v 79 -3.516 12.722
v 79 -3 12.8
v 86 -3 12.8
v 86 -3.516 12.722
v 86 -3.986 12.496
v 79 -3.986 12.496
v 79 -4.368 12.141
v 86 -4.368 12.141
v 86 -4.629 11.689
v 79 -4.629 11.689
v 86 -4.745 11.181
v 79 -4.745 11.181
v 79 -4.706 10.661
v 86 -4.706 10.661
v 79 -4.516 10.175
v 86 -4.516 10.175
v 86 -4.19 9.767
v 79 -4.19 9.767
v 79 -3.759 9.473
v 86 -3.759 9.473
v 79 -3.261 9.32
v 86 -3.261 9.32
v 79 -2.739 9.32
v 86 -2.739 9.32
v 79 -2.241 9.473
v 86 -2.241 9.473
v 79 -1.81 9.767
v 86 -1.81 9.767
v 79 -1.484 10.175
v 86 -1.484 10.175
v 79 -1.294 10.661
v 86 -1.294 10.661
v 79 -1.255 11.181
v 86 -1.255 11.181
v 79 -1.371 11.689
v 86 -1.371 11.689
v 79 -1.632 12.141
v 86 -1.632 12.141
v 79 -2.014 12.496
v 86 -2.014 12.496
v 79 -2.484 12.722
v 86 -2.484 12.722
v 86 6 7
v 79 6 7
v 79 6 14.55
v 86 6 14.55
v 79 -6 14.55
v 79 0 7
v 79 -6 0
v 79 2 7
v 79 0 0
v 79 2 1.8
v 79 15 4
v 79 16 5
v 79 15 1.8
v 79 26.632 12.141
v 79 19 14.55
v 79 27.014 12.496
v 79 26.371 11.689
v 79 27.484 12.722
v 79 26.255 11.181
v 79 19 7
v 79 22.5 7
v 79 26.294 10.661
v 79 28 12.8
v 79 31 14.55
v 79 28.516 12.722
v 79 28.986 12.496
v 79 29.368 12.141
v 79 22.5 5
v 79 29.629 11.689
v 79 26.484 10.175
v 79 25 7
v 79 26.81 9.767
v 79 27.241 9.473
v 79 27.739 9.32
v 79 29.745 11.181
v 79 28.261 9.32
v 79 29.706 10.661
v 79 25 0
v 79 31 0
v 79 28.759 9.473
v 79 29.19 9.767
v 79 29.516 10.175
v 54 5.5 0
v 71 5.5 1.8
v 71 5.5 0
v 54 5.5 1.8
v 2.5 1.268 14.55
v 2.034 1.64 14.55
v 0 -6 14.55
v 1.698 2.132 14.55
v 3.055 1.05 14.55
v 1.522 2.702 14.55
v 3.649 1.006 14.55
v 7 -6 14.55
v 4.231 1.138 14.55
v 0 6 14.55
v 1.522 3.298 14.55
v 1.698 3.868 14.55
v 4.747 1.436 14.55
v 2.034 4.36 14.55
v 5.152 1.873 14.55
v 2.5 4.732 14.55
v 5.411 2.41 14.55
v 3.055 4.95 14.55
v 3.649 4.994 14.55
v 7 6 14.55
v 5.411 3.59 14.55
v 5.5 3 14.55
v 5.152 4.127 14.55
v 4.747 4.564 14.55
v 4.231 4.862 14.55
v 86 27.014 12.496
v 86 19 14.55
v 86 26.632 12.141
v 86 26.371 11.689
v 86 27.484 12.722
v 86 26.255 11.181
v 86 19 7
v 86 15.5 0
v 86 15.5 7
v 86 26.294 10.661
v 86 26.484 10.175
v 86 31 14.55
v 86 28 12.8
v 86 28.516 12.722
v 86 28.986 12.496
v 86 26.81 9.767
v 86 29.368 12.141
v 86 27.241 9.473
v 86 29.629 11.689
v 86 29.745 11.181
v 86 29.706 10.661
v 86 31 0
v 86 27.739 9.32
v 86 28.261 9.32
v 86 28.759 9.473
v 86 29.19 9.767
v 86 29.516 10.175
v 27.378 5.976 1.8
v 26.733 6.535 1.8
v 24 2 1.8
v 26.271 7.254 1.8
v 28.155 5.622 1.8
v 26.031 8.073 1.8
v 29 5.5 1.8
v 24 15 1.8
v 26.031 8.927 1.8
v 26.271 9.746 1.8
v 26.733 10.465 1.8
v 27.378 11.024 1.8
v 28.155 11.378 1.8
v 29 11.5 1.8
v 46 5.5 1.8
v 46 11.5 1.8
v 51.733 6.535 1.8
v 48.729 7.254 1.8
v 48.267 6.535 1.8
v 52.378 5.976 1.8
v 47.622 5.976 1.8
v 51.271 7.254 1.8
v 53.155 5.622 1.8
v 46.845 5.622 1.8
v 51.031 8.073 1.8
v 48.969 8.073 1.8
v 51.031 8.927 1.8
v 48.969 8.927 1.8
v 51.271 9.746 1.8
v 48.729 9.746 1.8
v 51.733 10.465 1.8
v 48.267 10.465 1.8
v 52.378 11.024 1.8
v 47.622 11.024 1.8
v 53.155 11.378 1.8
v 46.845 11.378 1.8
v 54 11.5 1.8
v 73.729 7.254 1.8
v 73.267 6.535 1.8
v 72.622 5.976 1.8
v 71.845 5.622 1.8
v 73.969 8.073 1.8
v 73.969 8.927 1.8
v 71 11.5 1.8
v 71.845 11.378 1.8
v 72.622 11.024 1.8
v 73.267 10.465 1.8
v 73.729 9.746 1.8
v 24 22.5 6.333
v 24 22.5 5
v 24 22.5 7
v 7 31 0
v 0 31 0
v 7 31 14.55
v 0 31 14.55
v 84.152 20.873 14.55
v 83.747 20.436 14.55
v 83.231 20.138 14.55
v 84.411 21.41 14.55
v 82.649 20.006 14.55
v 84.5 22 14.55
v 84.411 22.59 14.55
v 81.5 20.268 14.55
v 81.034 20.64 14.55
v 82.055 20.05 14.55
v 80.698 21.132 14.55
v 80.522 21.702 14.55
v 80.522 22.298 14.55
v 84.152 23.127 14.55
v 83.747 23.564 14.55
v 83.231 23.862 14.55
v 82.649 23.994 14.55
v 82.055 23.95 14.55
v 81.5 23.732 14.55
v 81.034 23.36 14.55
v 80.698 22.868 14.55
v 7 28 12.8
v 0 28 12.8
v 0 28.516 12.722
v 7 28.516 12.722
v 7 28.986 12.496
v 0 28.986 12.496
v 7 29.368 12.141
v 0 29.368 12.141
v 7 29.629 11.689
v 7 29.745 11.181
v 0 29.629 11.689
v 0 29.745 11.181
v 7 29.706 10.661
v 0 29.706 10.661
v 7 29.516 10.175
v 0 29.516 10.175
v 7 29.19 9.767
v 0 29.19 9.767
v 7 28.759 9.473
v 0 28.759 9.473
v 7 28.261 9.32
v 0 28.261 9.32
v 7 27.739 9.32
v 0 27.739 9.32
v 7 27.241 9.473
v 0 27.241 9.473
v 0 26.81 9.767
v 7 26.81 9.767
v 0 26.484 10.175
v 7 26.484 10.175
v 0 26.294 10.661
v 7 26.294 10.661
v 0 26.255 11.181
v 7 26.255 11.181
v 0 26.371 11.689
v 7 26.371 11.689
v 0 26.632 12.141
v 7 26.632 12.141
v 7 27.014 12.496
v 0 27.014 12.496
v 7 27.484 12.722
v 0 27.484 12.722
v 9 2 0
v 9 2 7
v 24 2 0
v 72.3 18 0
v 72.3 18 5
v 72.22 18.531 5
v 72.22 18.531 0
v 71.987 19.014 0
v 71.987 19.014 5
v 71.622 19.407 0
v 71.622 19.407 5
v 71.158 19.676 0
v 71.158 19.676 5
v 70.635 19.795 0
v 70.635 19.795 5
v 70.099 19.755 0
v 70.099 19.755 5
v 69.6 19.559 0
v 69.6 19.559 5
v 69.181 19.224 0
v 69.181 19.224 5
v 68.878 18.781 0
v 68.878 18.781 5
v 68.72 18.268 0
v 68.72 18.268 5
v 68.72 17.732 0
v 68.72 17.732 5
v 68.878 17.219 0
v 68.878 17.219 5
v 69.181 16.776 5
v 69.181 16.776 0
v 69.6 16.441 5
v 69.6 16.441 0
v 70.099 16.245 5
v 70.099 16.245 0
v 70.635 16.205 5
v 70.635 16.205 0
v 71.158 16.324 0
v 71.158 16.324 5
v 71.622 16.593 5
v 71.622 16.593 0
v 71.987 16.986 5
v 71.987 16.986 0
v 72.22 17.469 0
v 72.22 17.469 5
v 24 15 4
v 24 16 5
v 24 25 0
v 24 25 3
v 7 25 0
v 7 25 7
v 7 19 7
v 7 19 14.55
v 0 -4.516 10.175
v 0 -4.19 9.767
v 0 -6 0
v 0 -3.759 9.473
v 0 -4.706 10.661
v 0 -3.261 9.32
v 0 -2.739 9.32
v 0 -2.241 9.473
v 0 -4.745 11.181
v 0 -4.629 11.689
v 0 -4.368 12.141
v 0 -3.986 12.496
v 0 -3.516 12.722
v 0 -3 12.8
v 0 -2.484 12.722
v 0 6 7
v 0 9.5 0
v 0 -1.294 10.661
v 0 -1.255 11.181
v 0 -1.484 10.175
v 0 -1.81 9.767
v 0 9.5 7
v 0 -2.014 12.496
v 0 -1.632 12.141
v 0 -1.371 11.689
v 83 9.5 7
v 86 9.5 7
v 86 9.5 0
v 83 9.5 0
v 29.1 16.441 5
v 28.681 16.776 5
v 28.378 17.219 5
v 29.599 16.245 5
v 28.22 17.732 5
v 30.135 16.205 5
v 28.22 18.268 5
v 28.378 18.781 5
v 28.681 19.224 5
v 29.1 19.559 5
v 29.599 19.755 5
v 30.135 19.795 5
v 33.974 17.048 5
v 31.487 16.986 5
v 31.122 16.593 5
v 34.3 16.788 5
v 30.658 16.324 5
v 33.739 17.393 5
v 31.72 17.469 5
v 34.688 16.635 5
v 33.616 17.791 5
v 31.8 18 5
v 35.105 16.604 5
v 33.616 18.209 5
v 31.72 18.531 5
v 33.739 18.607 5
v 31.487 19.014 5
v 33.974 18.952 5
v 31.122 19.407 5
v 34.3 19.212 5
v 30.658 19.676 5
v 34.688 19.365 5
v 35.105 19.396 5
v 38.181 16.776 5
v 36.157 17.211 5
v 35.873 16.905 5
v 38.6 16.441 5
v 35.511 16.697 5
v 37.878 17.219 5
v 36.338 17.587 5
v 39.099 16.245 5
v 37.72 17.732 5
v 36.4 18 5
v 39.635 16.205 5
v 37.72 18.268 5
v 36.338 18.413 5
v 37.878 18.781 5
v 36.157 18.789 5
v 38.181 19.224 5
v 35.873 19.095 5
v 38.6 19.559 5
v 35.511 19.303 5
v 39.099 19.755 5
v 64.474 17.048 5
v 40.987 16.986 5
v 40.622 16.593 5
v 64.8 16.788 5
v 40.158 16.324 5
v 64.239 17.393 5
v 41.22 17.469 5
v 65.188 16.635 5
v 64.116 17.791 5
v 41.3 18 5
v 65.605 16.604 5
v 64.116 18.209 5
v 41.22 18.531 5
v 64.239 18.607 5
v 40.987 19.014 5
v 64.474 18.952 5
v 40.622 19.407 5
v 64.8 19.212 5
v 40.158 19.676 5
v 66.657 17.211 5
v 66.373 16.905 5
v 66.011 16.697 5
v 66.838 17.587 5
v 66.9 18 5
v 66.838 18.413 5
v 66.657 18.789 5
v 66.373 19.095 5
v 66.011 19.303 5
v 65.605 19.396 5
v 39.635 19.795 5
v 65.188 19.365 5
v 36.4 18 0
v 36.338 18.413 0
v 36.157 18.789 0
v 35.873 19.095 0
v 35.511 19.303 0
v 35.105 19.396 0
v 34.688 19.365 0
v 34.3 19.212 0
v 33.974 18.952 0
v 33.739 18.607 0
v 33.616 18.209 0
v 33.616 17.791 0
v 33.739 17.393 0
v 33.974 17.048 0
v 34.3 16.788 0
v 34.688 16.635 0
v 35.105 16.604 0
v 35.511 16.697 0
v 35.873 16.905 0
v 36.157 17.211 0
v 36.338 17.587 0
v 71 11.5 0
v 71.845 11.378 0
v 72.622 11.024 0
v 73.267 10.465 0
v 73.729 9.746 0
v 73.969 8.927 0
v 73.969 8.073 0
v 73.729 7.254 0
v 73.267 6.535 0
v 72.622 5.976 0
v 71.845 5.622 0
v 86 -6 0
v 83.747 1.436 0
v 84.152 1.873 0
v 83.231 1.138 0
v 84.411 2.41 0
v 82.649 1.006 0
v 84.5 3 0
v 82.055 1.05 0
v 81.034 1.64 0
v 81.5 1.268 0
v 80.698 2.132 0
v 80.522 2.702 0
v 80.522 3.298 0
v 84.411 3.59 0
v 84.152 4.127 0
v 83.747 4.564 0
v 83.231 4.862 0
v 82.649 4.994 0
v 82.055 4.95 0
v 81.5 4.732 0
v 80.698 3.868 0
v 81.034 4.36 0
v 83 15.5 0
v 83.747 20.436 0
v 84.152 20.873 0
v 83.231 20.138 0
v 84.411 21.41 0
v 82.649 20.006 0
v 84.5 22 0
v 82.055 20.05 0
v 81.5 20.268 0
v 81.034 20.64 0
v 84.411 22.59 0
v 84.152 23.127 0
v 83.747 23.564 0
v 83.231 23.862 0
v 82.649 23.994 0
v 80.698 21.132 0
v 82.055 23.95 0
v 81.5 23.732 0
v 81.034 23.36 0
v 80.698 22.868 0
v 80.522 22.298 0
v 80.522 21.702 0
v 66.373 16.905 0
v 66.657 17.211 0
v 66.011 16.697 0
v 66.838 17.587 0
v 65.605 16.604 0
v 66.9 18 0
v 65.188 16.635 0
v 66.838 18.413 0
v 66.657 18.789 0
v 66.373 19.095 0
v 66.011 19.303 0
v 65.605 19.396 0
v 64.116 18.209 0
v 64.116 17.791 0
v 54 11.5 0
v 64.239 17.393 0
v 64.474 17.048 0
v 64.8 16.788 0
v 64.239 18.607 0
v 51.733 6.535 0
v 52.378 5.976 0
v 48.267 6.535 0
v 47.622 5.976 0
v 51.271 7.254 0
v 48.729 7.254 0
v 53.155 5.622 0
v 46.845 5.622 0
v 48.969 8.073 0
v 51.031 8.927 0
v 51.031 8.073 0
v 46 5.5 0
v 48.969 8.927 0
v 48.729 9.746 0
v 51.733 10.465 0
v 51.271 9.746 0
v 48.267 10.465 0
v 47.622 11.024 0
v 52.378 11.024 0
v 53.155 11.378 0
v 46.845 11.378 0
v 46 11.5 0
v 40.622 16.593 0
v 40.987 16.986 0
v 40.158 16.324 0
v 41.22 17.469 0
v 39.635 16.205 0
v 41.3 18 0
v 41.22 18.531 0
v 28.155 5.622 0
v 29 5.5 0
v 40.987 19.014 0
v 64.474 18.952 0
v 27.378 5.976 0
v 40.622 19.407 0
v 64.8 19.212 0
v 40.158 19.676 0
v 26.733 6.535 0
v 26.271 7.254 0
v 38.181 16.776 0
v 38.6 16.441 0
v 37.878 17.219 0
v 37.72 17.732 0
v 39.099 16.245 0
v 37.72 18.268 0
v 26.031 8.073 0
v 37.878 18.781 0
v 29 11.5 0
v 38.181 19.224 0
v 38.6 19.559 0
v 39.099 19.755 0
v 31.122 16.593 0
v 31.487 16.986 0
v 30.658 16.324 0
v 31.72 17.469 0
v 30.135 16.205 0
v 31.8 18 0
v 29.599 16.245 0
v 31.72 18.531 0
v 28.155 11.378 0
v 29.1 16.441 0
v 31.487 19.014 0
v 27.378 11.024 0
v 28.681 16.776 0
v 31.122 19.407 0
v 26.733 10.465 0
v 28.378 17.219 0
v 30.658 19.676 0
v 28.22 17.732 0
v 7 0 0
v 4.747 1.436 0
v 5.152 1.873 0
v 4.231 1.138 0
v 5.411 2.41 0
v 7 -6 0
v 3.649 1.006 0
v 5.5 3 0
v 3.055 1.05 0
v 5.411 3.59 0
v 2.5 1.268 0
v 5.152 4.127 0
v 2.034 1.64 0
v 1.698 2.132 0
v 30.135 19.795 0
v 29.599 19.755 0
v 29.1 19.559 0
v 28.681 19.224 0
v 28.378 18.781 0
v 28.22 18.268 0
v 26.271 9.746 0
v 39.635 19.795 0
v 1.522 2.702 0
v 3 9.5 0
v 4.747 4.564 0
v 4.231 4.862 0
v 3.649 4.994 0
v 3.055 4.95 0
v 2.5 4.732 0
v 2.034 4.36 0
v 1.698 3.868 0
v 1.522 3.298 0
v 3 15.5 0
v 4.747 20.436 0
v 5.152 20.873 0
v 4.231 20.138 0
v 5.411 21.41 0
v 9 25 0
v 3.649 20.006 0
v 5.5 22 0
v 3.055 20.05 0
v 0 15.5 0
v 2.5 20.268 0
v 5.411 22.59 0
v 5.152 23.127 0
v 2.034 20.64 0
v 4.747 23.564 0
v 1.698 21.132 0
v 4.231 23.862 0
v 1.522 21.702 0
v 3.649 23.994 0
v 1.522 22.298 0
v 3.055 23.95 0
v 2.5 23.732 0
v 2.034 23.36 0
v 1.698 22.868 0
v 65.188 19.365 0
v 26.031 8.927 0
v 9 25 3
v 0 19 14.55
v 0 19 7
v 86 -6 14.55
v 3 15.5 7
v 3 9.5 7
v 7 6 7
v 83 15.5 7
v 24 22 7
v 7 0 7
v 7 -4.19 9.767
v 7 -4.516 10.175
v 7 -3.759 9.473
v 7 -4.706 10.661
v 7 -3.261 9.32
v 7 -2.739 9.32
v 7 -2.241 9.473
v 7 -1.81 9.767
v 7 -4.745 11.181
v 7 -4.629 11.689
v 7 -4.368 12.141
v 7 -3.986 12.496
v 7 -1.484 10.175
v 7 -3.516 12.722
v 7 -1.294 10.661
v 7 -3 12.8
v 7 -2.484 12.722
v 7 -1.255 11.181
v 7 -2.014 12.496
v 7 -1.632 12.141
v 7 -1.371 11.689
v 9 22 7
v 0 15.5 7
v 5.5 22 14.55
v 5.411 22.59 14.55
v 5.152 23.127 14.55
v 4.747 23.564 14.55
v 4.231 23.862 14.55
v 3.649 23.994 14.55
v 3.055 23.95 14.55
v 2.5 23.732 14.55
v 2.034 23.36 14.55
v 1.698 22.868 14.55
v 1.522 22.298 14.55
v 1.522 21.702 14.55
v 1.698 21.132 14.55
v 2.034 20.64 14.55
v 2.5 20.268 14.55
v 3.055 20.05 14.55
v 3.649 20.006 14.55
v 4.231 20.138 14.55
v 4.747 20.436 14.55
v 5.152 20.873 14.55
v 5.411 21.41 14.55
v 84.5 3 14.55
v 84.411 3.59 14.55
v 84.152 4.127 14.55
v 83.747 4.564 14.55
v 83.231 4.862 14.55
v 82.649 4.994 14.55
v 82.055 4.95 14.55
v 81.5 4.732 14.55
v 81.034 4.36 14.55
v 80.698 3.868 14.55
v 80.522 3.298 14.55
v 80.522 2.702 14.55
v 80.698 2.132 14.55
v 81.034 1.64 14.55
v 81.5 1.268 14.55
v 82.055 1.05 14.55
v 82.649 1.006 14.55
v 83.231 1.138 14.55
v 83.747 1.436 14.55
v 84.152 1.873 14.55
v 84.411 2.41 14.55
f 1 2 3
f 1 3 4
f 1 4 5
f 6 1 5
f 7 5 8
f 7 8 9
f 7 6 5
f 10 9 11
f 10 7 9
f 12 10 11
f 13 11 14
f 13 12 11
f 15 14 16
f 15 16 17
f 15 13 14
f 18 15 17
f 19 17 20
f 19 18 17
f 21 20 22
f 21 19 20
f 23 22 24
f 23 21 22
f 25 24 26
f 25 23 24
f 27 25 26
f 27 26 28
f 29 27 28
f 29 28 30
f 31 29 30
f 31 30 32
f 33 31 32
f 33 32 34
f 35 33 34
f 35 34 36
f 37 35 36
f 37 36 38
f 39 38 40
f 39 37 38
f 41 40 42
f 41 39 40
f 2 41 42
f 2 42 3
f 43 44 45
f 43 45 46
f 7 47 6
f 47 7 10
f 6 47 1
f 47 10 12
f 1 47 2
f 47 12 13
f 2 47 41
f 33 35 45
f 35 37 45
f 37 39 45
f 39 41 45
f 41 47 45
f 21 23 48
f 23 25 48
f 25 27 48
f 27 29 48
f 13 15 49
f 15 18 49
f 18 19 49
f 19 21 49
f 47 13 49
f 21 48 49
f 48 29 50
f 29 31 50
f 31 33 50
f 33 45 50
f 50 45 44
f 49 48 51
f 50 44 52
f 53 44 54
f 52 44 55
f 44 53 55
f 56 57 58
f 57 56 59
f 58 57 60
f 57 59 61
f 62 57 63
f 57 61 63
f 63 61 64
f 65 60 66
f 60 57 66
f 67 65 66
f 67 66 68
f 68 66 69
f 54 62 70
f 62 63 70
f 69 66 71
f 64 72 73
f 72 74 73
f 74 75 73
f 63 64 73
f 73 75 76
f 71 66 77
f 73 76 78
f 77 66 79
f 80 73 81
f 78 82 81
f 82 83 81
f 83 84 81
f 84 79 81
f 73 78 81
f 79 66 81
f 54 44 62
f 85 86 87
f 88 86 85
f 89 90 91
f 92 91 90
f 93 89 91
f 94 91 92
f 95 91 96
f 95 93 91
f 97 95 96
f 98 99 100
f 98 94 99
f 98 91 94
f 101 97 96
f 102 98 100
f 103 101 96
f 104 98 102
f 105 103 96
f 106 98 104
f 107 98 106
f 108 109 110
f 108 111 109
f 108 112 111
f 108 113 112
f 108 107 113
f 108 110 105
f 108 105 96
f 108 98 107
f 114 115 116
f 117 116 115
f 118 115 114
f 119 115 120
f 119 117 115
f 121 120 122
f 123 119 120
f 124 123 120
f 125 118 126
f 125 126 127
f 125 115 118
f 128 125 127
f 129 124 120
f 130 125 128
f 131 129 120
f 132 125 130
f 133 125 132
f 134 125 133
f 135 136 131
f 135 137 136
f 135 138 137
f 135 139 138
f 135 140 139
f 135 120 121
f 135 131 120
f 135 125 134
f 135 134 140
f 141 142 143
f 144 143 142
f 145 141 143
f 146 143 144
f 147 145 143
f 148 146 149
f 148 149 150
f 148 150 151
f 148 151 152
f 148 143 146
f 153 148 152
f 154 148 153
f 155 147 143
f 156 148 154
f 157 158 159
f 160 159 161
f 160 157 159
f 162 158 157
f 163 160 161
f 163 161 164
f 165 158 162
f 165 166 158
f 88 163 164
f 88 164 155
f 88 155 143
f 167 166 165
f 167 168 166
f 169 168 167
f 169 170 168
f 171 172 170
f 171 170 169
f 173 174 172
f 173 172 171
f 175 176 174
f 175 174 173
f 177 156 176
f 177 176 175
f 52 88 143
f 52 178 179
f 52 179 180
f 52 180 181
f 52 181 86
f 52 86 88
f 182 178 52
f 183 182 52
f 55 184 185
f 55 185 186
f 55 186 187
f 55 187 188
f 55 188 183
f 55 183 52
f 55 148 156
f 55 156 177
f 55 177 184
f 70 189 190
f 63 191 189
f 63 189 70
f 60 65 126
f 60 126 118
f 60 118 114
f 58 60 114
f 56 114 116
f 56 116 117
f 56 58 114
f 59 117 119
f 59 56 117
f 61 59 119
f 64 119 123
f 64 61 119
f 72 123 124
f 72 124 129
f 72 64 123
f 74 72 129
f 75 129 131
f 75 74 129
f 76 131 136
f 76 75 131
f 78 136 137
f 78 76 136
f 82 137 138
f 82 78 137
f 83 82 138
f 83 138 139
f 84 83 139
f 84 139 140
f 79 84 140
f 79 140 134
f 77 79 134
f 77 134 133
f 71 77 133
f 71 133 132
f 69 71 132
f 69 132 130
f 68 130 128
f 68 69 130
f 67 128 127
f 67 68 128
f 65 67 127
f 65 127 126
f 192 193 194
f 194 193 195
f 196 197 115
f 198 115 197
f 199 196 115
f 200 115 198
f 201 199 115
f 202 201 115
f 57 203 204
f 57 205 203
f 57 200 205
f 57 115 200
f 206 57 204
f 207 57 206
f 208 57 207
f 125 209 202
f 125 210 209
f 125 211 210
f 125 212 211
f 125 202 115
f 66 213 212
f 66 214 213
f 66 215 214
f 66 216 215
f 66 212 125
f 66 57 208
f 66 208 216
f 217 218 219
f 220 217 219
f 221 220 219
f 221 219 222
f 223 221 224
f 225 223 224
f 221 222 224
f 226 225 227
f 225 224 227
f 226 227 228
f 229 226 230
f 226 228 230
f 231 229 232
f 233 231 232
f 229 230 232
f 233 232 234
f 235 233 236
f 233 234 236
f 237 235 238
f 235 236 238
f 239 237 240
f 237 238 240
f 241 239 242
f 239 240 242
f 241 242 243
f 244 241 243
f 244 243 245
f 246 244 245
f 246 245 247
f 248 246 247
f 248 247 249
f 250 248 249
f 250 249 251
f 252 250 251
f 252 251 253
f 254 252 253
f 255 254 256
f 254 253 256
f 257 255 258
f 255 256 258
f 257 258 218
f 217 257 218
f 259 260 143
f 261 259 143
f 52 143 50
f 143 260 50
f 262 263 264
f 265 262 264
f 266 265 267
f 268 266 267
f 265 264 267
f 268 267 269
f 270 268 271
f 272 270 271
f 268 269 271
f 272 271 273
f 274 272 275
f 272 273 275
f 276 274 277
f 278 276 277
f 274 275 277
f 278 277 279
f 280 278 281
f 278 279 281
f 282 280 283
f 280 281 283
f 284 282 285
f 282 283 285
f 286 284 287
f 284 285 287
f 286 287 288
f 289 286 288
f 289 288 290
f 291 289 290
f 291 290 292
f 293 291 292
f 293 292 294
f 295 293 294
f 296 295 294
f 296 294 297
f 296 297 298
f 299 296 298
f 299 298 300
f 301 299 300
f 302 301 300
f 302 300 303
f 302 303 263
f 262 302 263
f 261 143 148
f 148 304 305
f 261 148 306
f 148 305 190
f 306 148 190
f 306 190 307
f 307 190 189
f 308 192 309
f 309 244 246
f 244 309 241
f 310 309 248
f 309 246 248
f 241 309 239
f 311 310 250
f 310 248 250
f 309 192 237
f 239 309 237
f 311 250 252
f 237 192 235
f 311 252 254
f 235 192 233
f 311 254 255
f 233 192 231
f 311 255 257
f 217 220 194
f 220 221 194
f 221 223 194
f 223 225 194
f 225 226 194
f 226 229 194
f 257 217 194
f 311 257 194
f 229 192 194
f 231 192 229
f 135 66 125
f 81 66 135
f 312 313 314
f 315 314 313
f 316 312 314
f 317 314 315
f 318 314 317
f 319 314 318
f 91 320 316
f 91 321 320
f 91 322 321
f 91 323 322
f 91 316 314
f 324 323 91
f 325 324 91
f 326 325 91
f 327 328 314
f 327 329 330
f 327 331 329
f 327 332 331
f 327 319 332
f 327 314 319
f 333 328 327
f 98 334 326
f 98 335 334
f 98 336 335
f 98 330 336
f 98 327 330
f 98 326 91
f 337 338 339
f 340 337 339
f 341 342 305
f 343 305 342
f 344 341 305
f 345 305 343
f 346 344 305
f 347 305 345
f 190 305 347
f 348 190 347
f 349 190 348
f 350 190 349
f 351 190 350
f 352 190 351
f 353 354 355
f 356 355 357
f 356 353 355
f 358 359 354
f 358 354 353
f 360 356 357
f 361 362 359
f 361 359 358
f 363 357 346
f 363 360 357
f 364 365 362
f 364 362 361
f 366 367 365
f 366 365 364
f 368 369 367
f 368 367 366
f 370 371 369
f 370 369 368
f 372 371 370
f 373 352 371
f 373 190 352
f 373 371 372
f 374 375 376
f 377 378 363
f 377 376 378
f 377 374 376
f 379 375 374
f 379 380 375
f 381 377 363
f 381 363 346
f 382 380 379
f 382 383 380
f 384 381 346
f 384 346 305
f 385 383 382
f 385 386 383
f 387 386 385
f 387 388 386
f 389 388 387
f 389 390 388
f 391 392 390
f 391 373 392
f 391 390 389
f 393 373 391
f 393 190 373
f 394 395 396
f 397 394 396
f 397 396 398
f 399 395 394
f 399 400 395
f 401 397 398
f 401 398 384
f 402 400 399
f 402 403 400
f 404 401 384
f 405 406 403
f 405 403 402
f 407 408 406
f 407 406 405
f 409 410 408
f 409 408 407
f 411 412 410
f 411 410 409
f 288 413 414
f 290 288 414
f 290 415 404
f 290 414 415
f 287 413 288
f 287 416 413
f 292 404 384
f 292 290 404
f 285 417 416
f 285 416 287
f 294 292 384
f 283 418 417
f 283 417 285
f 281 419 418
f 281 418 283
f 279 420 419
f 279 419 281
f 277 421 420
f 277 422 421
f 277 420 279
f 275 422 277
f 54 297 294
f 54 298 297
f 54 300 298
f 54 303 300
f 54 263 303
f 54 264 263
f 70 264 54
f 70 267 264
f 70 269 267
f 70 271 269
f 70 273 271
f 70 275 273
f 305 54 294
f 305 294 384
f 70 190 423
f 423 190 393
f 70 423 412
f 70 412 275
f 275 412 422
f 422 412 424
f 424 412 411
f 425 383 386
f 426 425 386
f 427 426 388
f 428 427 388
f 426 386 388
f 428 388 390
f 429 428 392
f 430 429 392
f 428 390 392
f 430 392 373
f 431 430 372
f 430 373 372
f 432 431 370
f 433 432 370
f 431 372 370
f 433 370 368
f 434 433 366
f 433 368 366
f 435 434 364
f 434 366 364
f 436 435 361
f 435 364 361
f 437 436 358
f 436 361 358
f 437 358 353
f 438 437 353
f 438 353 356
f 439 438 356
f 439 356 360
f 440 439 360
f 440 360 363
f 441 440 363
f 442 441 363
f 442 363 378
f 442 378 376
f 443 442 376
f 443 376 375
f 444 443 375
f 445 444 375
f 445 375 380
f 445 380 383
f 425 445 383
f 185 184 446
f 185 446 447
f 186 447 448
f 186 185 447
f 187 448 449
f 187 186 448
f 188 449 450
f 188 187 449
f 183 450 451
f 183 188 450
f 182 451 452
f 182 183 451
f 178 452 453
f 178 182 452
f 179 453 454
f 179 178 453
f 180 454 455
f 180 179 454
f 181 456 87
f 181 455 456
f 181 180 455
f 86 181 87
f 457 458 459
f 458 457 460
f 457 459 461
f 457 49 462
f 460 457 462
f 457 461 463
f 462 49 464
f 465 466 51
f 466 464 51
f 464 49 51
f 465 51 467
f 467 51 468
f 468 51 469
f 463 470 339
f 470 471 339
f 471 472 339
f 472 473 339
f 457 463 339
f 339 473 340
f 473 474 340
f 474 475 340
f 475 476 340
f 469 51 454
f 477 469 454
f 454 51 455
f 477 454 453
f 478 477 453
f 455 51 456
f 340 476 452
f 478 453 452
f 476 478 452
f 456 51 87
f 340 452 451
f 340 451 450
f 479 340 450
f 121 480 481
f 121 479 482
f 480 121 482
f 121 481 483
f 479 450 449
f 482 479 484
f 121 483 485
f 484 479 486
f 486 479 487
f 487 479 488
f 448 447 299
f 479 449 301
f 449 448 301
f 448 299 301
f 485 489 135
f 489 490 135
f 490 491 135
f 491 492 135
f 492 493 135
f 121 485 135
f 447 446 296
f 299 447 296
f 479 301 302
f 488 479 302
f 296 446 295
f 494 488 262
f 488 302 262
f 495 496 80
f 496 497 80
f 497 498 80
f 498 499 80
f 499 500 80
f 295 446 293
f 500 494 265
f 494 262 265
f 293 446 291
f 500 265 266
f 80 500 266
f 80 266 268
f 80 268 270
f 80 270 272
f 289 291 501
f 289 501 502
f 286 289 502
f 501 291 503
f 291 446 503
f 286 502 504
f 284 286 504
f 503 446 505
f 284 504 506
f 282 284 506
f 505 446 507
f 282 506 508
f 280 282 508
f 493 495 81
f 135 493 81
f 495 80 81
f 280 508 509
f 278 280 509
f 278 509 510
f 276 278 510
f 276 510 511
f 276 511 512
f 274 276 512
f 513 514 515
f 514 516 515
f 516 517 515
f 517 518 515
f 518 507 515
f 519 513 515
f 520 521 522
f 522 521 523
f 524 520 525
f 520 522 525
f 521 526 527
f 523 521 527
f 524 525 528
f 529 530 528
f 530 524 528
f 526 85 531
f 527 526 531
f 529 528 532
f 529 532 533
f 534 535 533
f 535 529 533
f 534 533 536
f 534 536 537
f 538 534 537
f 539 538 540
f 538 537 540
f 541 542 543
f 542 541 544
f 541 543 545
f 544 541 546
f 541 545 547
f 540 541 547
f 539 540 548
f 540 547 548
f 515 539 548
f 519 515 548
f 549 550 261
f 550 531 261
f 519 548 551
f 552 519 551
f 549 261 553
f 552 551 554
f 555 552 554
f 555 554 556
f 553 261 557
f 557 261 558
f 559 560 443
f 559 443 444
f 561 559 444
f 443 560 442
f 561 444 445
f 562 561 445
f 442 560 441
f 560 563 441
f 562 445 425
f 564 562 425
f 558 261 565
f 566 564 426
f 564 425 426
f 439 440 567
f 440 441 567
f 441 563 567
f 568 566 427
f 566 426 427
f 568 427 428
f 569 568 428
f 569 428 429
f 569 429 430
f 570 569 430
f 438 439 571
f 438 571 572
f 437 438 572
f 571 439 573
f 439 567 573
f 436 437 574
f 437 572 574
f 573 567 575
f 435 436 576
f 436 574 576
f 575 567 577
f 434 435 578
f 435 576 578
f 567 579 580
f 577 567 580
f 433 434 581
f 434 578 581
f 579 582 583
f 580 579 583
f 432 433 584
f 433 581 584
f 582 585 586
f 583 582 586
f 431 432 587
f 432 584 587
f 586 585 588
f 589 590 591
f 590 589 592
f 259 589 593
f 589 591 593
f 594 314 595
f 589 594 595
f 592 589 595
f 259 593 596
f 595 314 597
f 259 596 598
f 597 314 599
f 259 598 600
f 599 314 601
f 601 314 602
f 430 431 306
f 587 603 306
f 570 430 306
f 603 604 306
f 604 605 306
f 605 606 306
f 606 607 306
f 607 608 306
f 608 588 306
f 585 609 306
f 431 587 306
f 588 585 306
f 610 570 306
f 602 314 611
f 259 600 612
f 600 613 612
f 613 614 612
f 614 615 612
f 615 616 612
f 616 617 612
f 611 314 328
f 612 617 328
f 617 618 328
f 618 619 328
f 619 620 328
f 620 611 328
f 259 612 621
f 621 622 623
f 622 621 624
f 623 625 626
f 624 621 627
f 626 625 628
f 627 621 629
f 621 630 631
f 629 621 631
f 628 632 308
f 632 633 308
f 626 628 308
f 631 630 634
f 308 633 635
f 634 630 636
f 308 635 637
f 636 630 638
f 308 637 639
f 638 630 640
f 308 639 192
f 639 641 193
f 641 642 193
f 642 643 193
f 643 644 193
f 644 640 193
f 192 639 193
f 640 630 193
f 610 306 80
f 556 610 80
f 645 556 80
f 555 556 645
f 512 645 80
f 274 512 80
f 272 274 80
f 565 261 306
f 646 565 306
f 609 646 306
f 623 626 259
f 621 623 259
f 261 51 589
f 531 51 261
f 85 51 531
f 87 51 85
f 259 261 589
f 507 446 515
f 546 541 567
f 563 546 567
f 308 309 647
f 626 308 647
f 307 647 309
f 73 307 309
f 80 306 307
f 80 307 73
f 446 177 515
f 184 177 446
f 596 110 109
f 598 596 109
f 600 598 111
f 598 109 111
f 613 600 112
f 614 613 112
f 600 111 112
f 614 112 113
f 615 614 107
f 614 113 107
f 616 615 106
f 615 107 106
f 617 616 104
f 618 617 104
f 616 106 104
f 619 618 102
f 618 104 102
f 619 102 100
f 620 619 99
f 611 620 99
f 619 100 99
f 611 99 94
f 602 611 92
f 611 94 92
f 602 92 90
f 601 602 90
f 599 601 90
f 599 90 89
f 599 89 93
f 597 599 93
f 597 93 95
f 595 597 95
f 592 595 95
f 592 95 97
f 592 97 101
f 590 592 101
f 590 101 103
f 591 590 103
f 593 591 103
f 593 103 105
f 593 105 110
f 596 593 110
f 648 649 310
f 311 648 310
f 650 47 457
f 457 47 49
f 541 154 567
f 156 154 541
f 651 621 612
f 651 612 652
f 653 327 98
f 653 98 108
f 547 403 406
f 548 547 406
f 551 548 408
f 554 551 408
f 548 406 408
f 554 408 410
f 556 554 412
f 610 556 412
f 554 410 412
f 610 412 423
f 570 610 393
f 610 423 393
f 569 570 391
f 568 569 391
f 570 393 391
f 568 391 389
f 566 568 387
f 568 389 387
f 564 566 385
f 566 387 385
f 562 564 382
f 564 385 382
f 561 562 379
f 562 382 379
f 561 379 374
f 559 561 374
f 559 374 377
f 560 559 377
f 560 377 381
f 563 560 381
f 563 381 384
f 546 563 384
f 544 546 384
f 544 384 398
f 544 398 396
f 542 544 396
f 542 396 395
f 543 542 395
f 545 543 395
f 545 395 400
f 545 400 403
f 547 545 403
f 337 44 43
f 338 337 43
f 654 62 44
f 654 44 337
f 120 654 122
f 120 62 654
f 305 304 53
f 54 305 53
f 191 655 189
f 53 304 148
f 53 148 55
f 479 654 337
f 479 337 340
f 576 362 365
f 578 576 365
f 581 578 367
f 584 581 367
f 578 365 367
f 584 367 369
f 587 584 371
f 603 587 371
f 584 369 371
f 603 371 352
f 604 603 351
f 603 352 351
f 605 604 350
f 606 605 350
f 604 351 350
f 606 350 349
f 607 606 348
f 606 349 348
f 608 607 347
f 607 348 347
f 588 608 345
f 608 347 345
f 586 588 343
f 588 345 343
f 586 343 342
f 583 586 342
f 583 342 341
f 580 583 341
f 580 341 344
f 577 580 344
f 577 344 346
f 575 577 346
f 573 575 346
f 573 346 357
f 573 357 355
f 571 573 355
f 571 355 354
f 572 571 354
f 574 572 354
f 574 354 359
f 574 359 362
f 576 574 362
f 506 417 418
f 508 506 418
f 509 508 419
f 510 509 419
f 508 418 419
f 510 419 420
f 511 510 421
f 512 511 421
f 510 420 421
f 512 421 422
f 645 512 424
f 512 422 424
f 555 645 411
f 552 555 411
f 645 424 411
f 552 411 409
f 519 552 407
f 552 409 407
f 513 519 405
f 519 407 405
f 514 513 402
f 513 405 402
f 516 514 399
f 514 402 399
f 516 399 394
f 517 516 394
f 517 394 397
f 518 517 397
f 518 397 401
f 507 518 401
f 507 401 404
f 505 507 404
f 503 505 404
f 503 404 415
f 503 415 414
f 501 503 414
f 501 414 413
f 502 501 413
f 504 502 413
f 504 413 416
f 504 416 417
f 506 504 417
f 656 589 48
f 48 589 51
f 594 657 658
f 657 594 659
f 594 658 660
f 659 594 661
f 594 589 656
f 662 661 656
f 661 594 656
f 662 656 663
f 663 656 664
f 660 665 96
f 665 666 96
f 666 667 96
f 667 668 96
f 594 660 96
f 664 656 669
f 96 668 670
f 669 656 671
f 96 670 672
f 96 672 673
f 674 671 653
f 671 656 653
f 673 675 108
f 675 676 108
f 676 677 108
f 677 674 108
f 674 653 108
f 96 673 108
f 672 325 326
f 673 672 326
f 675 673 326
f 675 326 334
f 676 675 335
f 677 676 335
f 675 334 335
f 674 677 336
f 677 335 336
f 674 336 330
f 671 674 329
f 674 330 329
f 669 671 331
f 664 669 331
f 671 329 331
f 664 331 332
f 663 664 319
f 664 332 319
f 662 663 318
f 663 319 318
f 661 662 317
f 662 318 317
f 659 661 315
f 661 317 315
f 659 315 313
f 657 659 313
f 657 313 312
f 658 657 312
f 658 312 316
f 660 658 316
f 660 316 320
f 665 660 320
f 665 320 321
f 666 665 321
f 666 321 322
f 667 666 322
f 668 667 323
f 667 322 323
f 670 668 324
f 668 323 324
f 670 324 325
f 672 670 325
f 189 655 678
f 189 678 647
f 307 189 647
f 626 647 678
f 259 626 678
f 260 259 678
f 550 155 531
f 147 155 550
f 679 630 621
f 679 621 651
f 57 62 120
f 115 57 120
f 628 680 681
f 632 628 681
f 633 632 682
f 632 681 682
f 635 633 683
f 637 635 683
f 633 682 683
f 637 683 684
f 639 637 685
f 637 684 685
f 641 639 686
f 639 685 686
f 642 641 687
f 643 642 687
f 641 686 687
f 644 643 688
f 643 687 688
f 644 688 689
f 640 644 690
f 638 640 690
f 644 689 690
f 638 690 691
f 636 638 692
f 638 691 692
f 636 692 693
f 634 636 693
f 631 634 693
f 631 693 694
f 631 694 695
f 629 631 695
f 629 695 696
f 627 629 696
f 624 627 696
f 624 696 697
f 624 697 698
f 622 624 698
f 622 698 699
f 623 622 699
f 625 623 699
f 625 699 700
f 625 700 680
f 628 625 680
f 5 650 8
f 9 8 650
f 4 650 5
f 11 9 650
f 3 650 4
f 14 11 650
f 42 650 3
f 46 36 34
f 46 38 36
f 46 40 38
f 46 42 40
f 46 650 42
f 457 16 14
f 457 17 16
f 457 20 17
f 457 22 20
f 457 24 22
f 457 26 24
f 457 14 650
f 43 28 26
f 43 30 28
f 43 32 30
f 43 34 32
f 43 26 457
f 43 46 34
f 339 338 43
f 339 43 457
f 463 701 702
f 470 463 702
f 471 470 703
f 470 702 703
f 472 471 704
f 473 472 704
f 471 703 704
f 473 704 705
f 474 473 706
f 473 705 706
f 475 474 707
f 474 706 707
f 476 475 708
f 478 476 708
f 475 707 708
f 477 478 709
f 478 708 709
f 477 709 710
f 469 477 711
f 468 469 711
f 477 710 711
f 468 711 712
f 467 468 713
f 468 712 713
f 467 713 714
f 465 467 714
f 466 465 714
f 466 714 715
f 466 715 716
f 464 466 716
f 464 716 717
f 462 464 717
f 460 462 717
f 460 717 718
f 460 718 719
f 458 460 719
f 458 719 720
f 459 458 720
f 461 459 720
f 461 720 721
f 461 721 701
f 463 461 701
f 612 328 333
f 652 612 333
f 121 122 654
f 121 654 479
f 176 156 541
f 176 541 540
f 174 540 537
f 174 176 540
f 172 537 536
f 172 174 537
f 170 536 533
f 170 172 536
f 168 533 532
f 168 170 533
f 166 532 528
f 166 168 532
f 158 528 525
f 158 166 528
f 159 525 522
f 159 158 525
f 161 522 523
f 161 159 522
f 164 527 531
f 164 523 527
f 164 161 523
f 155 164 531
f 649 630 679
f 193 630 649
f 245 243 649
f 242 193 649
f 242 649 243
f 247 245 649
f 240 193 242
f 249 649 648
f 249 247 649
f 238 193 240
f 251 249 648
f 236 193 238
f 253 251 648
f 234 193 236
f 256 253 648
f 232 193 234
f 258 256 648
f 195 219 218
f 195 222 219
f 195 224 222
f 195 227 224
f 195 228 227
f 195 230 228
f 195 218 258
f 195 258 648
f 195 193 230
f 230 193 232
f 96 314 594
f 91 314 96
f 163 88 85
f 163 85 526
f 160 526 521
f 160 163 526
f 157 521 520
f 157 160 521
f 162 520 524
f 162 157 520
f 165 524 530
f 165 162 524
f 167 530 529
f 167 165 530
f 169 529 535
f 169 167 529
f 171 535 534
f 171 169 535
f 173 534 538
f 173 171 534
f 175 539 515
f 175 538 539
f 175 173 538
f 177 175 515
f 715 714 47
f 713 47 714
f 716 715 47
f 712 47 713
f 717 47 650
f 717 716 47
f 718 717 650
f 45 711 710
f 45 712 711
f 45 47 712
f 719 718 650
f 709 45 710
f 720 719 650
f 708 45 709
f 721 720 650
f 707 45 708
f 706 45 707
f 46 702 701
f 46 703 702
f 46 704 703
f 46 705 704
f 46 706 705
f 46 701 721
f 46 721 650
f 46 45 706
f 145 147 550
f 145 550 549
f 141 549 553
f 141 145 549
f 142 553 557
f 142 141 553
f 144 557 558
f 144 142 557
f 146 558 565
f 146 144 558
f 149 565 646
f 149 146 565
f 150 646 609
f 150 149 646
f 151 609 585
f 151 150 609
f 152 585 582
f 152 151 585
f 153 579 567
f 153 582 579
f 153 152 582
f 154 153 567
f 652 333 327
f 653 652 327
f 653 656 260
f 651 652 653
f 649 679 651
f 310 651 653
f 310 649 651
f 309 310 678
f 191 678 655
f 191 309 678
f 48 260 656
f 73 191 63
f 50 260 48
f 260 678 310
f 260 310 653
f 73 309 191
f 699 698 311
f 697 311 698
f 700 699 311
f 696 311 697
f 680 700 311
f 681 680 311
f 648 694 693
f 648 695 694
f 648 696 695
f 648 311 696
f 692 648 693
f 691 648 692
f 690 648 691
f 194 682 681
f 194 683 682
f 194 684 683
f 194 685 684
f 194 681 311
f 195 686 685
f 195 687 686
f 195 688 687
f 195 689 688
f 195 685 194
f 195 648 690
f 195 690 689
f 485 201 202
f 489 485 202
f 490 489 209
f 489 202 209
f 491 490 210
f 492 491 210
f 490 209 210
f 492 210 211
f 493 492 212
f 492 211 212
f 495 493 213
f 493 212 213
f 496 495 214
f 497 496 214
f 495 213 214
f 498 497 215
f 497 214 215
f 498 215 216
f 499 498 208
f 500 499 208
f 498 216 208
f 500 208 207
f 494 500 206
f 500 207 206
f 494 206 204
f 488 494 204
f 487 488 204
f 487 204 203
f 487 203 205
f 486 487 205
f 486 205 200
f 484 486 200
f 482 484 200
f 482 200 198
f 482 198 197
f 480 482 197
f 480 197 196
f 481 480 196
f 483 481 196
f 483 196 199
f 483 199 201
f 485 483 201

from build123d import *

# Parameters (mm, degrees)
SKETCH_1_W           = 86
SKETCH_1_H           = 25
EXTRUDE_1_DEPTH      = 7
SKETCH_2_W           = 15
SKETCH_2_H           = 17
CUT_EXTRUDE_1_DEPTH  = 90.833178726
SKETCH_3_W           = 55
SKETCH_3_H           = 13
CUT_EXTRUDE_2_DEPTH  = 5.2
SKETCH_4_W           = 55
SKETCH_4_H           = 7.5
CUT_EXTRUDE_3_DEPTH  = 2
CHAMFER_1_SIZE       = 1
SKETCH_5_R           = 1.8
CUT_EXTRUDE_4_DEPTH  = 90.699498326
SKETCH_6_R           = 1.4
CUT_EXTRUDE_5_DEPTH  = 90.699498326
CUT_EXTRUDE_6_DEPTH  = 90.710868907
SKETCH_8_W           = 7
SKETCH_8_H           = 6
EXTRUDE_2_DEPTH      = 7.55
SKETCH_9_R           = 2
CUT_EXTRUDE_7_DEPTH  = 91.734241056
SKETCH_10_W          = 14.55
SKETCH_10_H          = 6
SKETCH_10_R          = 1.75
EXTRUDE_3_DEPTH      = 7
EXTRUDE_START        = -7
SKETCH_12_W          = 14.55
SKETCH_12_H          = 6
SKETCH_12_R          = 1.75
EXTRUDE_5_DEPTH      = 7
SKETCH_13_W          = 7
SKETCH_13_H          = 6
CUT_EXTRUDE_8_DEPTH  = 3
SKETCH_14_W          = 7
SKETCH_14_H          = 6
CUT_EXTRUDE_9_DEPTH  = 3
CUT_EXTRUDE_10_DEPTH = 15


with BuildPart() as part:
    # 草图1 → 凸台-拉伸1 (new body)
    with BuildSketch(Plane.XY):
        with Locations((43, 12.5)):
            Rectangle(SKETCH_1_W, SKETCH_1_H)
    extrude(amount=EXTRUDE_1_DEPTH)

    # 草图2 → 切除-拉伸1 (cut, through all)
    with BuildSketch(Plane.XY.offset(7)):
        with Locations((16.5, 10.5)):
            Rectangle(SKETCH_2_W, SKETCH_2_H)
    extrude(amount=-CUT_EXTRUDE_1_DEPTH, mode=Mode.SUBTRACT)

    # 草图3 → 切除-拉伸2 (cut)
    with BuildSketch(Plane.XY.offset(7)):
        with Locations((51.5, 8.5)):
            Rectangle(SKETCH_3_W, SKETCH_3_H)
    extrude(amount=-CUT_EXTRUDE_2_DEPTH, mode=Mode.SUBTRACT)

    # 草图4 → 切除-拉伸3 (cut)
    with BuildSketch(Plane.XY.offset(7)):
        with Locations((51.5, 18.75)):
            Rectangle(SKETCH_4_W, SKETCH_4_H)
    extrude(amount=-CUT_EXTRUDE_3_DEPTH, mode=Mode.SUBTRACT)

    # 倒角1
    chamfer_1_edges = [part.edges().sort_by_distance(p)[0] for p in [
        (51.5, 15, 5),
    ]]
    chamfer(chamfer_1_edges, length=CHAMFER_1_SIZE)

    # 草图5 → 切除-拉伸4 (cut, through all)
    with BuildSketch(Plane.XY.offset(5)):
        with Locations((30, 18)):
            Circle(SKETCH_5_R)
        with Locations((39.5, 18)):
            Circle(SKETCH_5_R)
        with Locations((70.5, 18)):
            Circle(SKETCH_5_R)
    extrude(amount=-CUT_EXTRUDE_4_DEPTH, mode=Mode.SUBTRACT)

    # 草图6 → 切除-拉伸5 (cut, through all)
    with BuildSketch(Plane.XY.offset(5)):
        with Locations((35, 18)):
            Circle(SKETCH_6_R)
        with Locations((65.5, 18)):
            Circle(SKETCH_6_R)
    extrude(amount=-CUT_EXTRUDE_5_DEPTH, mode=Mode.SUBTRACT)

    # 草图7 → 切除-拉伸6 (cut, through all)
    with BuildSketch(Plane.XY.offset(1.8)):
        with BuildLine():
            Line((29, 11.5), (46, 11.5))
            ThreePointArc((46, 11.5), (49, 8.5), (46, 5.5))
            Line((46, 5.5), (29, 5.5))
            ThreePointArc((29, 5.5), (26, 8.5), (29, 11.5))
        make_face()
        with BuildLine():
            Line((54, 11.5), (71, 11.5))
            ThreePointArc((71, 11.5), (74, 8.5), (71, 5.5))
            Line((71, 5.5), (54, 5.5))
            ThreePointArc((54, 5.5), (51, 8.5), (54, 11.5))
        make_face()
    extrude(amount=-CUT_EXTRUDE_6_DEPTH, mode=Mode.SUBTRACT)

    # 草图8 → 凸台-拉伸2 (add)
    with BuildSketch(Plane.XY.offset(7)):
        with Locations((3.5, 22)):
            Rectangle(SKETCH_8_W, SKETCH_8_H)
        with Locations((82.5, 3)):
            Rectangle(SKETCH_8_W, SKETCH_8_H)
        with Locations((3.5, 3)):
            Rectangle(SKETCH_8_W, SKETCH_8_H)
        with Locations((82.5, 22)):
            Rectangle(SKETCH_8_W, SKETCH_8_H)
    extrude(amount=EXTRUDE_2_DEPTH)

    # 草图9 → 切除-拉伸7 (cut, through all)
    with BuildSketch(Plane.XY.offset(14.55)):
        with Locations((3.5, 22)):
            Circle(SKETCH_9_R)
        with Locations((82.5, 3)):
            Circle(SKETCH_9_R)
        with Locations((82.5, 22)):
            Circle(SKETCH_9_R)
        with Locations((3.5, 3)):
            Circle(SKETCH_9_R)
    extrude(amount=-CUT_EXTRUDE_7_DEPTH, mode=Mode.SUBTRACT)

    # 草图10 → 凸台-拉伸3 (add)
    # profile 1 of 2: a face of its own
    with BuildSketch(Plane.ZY):
        with Locations((7.275, 28)):
            Rectangle(SKETCH_10_W, SKETCH_10_H)
        with Locations((11.05, 28)):
            Circle(SKETCH_10_R, mode=Mode.SUBTRACT)
    # profile 2 of 2: a face of its own
    with BuildSketch(Plane.ZY):
        with Locations((7.275, -3)):
            Rectangle(SKETCH_10_W, SKETCH_10_H)
        with Locations((11.05, -3)):
            Circle(SKETCH_10_R, mode=Mode.SUBTRACT)
    extrude(amount=-EXTRUDE_3_DEPTH)

    # 草图12 → 凸台-拉伸5 (add)
    # profile 1 of 2: a face of its own
    with BuildSketch(Plane(origin=(86, 0, 0), x_dir=(0, 0, -1), z_dir=(1, 0, 0)).offset(EXTRUDE_START)):
        with Locations((-7.275, 28)):
            Rectangle(SKETCH_12_W, SKETCH_12_H)
        with Locations(Location((-11.05, 28, 0), (0, 0, 180))):
            Circle(SKETCH_12_R, mode=Mode.SUBTRACT)
    # profile 2 of 2: a face of its own
    with BuildSketch(Plane(origin=(86, 0, 0), x_dir=(0, 0, -1), z_dir=(1, 0, 0)).offset(EXTRUDE_START)):
        with Locations((-7.275, -3)):
            Rectangle(SKETCH_12_W, SKETCH_12_H)
        with Locations(Location((-11.05, -3, 0), (0, 0, 180))):
            Circle(SKETCH_12_R, mode=Mode.SUBTRACT)
    extrude(amount=EXTRUDE_5_DEPTH)

    # 草图13 → 切除-拉伸8 (cut)
    with BuildSketch(Plane.ZY):
        with Locations((3.5, 12.5)):
            Rectangle(SKETCH_13_W, SKETCH_13_H)
    extrude(amount=-CUT_EXTRUDE_8_DEPTH, mode=Mode.SUBTRACT)

    # 草图14 → 切除-拉伸9 (cut)
    with BuildSketch(Plane(origin=(86, 0, 0), x_dir=(0, 0, -1), z_dir=(1, 0, 0))):
        with Locations((-3.5, 12.5)):
            Rectangle(SKETCH_14_W, SKETCH_14_H)
    extrude(amount=-CUT_EXTRUDE_9_DEPTH, mode=Mode.SUBTRACT)

    # 草图20 → 切除-拉伸10 (cut)
    with BuildSketch(Plane.ZY.offset(-24)):
        Polygon((0, 19), (7, 19), (7, 22), (3, 25), (0, 25), align=None)
    extrude(amount=CUT_EXTRUDE_10_DEPTH, mode=Mode.SUBTRACT)


solid = part.part
